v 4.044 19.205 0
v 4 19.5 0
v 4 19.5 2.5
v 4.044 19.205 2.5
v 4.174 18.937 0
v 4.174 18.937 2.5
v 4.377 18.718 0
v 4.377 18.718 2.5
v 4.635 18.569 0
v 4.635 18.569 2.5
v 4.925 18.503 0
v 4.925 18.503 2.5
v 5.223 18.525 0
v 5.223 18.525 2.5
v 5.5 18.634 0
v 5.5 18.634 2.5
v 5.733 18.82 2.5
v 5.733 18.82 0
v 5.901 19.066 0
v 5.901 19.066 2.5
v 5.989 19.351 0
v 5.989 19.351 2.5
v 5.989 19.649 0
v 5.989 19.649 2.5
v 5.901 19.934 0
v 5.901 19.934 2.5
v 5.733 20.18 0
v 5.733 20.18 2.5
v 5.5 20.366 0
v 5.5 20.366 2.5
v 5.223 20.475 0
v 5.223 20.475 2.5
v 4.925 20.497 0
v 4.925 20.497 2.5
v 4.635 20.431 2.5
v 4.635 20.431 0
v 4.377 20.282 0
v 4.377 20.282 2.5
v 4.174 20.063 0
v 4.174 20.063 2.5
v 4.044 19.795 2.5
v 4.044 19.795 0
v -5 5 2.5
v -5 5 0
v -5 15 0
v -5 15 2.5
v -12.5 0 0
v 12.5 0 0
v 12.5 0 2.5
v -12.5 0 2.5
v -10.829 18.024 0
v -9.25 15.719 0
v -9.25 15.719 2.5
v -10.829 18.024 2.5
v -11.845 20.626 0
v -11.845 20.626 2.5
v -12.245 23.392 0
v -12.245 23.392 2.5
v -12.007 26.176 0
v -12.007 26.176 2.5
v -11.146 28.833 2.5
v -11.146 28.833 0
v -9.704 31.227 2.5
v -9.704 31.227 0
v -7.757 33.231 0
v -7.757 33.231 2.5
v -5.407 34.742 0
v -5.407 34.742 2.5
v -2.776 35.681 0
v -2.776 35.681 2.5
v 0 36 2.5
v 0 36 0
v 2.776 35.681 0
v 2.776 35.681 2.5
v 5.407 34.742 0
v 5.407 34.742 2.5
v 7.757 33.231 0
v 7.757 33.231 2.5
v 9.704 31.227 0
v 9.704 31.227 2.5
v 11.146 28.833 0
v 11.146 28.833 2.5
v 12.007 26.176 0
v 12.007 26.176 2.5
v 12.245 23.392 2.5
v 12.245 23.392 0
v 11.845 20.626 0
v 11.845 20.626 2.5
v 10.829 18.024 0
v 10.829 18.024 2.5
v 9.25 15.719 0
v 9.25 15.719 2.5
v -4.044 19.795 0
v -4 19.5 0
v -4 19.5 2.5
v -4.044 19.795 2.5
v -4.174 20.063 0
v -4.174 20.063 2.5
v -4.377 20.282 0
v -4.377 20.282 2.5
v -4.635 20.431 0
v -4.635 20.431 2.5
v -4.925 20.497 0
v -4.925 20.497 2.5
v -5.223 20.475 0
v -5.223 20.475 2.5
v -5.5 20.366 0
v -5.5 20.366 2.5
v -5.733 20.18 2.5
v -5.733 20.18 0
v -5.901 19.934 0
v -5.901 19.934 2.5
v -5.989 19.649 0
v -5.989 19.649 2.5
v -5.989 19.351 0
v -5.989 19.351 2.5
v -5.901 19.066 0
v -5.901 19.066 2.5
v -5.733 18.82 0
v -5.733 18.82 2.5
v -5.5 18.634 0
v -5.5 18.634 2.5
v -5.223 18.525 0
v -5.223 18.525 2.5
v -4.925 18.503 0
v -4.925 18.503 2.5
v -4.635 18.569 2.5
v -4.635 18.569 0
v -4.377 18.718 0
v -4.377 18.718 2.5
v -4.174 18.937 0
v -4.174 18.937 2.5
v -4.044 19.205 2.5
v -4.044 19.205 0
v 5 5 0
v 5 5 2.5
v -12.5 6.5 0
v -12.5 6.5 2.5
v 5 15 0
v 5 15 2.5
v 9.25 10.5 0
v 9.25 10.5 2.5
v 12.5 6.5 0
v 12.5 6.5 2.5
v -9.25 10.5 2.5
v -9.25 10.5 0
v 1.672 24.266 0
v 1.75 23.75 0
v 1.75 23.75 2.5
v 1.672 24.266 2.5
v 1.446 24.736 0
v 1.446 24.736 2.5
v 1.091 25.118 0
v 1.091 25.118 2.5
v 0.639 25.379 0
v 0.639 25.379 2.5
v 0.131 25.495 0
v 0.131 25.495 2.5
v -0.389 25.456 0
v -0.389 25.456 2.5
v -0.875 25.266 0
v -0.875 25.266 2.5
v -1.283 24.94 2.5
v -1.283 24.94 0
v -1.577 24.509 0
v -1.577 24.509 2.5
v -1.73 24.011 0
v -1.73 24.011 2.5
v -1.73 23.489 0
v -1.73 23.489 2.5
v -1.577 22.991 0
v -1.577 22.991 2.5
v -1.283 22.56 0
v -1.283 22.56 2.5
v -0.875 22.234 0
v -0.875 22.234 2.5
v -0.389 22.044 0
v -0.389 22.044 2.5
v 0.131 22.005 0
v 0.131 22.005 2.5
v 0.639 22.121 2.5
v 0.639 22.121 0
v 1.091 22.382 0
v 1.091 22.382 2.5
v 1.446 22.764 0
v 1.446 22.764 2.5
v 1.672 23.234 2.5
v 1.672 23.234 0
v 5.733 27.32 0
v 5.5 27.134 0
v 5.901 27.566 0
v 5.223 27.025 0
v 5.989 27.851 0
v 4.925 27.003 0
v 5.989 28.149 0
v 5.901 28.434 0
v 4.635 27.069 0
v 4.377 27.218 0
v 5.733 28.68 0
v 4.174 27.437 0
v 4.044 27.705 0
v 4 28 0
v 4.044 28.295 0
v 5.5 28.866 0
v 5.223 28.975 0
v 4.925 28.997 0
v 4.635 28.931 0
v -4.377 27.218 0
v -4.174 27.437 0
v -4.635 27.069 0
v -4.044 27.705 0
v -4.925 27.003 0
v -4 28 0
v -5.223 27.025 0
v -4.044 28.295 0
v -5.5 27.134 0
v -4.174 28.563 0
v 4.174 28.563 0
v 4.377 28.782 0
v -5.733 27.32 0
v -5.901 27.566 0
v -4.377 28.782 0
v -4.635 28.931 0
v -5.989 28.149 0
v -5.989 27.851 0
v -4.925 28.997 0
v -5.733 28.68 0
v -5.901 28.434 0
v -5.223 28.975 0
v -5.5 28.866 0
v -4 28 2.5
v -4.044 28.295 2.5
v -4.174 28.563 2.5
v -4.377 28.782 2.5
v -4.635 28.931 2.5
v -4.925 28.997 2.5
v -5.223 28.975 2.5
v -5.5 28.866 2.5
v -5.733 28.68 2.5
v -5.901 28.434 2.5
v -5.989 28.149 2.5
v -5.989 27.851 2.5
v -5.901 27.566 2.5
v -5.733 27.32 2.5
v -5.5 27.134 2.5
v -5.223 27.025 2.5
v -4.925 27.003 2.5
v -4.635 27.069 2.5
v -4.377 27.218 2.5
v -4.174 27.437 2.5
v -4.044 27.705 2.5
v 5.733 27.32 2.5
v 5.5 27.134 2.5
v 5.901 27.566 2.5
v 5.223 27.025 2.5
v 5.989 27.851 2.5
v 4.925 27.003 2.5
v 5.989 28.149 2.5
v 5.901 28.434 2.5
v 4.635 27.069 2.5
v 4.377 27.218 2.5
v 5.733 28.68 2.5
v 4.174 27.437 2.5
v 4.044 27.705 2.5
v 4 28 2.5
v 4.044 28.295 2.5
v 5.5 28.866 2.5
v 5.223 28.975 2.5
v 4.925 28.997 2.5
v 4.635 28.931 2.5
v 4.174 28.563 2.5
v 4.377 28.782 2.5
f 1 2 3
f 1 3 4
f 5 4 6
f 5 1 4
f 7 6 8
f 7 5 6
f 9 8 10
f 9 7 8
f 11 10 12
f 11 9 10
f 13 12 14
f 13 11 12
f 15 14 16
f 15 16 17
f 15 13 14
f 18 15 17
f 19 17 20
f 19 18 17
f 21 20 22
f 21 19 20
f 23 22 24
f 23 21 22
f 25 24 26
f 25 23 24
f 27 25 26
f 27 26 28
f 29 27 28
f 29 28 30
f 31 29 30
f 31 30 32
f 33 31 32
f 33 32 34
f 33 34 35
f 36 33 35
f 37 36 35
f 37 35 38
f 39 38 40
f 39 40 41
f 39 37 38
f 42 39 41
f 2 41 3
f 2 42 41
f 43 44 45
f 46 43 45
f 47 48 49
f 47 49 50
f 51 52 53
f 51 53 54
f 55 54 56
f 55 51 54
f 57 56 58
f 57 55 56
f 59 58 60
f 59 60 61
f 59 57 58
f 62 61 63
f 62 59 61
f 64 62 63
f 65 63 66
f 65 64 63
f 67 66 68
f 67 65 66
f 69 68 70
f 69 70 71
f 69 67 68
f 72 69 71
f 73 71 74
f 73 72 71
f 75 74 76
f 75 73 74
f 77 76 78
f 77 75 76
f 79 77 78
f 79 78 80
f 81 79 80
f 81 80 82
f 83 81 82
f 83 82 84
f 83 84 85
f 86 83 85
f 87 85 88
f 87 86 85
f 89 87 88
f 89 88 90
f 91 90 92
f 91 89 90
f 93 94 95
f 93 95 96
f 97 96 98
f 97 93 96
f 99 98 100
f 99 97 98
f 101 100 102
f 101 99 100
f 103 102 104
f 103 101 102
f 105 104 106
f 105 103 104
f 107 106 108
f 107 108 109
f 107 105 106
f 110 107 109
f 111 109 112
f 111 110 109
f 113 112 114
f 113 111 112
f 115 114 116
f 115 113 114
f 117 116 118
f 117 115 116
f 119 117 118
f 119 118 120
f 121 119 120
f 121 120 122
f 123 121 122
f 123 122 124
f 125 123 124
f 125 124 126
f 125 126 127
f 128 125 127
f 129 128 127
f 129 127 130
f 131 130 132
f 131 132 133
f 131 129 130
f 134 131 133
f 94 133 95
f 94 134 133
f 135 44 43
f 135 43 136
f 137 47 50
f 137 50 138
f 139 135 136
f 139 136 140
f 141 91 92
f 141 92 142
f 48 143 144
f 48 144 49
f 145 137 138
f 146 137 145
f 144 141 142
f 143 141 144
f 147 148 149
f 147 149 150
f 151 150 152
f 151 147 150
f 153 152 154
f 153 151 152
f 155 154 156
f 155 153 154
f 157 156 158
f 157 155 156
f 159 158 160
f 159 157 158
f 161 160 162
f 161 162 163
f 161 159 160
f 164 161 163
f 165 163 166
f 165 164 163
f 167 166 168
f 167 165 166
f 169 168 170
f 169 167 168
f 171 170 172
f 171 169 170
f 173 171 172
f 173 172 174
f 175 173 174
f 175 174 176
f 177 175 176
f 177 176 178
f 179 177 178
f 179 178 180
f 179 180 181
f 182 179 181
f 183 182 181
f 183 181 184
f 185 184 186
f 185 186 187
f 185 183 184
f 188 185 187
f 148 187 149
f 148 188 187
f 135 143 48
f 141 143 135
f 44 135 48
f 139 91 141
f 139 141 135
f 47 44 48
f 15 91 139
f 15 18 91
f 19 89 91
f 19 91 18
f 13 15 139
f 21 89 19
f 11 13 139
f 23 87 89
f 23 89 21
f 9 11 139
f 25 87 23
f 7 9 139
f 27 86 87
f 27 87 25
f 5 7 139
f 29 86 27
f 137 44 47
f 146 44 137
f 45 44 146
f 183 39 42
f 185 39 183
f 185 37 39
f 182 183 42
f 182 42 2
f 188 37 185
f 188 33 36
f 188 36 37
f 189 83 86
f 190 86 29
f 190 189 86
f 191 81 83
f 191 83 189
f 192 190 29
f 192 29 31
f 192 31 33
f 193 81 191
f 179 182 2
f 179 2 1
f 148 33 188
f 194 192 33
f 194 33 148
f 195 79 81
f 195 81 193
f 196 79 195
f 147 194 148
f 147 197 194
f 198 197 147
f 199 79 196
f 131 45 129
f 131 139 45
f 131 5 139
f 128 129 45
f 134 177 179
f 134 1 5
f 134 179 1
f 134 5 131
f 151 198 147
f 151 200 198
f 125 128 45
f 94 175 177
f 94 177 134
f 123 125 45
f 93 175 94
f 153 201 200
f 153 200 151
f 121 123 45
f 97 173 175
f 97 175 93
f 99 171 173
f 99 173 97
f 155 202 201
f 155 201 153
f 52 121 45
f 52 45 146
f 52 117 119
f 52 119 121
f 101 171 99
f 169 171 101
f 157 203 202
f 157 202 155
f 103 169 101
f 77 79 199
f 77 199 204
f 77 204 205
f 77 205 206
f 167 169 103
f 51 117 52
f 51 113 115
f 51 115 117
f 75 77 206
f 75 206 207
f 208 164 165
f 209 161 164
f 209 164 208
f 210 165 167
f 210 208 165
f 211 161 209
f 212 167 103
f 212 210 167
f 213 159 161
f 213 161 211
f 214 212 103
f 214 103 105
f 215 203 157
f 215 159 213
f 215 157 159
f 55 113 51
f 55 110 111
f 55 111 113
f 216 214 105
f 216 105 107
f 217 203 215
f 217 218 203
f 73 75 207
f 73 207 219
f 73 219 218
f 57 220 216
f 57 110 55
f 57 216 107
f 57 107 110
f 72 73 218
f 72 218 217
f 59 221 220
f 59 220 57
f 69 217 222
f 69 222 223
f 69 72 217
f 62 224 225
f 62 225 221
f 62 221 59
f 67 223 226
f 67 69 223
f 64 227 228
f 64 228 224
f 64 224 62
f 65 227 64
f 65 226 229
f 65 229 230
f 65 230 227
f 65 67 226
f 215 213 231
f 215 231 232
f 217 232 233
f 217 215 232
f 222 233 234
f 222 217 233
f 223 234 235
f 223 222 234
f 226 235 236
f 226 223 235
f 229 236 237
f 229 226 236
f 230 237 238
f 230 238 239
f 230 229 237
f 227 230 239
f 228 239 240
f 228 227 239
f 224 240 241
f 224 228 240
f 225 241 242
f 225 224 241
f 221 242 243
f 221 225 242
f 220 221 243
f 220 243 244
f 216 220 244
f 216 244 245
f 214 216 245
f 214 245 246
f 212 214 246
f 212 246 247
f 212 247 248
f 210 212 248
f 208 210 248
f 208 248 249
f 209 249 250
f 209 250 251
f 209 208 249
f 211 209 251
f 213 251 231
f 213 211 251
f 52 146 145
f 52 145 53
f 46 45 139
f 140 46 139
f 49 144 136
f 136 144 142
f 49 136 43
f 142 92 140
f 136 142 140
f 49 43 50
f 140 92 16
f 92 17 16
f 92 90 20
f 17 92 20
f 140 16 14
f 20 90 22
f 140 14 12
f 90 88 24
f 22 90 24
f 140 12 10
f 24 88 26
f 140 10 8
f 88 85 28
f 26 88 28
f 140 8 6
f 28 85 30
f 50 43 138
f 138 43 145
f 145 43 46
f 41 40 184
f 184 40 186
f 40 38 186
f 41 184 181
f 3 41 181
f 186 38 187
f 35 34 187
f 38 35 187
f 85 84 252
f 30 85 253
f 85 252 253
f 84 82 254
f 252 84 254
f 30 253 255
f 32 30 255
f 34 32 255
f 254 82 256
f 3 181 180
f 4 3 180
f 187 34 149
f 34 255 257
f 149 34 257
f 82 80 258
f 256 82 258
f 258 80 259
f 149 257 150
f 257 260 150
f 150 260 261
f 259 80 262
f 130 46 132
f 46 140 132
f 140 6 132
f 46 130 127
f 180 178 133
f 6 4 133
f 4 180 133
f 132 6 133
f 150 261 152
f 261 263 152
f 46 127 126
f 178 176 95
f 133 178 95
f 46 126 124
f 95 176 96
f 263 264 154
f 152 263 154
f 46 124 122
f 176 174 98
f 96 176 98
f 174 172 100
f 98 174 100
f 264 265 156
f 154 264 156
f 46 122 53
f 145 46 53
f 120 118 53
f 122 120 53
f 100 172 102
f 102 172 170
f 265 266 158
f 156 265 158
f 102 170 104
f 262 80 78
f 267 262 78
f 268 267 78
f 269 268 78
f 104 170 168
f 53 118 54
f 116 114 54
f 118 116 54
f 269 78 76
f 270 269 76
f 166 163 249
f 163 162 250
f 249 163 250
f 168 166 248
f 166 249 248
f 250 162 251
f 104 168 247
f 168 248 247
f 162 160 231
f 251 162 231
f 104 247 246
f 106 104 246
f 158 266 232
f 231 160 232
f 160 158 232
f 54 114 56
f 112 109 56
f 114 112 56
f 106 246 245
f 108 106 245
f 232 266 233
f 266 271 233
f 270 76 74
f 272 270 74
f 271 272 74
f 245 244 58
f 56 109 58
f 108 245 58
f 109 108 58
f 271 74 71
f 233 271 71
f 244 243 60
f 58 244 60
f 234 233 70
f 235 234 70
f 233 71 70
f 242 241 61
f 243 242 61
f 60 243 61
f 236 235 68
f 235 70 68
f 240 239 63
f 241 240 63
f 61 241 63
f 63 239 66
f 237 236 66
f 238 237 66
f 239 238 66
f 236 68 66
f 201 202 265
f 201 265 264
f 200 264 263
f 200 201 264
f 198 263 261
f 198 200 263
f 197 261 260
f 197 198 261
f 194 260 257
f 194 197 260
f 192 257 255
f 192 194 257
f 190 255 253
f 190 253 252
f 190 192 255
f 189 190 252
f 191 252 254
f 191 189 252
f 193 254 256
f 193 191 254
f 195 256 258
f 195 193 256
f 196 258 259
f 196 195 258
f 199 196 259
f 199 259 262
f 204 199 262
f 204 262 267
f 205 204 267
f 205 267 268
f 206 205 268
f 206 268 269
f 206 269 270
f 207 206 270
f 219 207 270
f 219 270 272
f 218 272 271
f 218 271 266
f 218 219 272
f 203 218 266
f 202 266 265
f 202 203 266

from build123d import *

# Parameters (mm, degrees)
SZKIC1_R                    = 1.75
SZKIC1_R_2                  = 1
SZKIC1_W                    = 10
SZKIC1_H                    = 10
DODANIE_WYCI_GNI_CIE1_DEPTH = 2.5


with BuildPart() as part:
    # Szkic1 → Dodanie-wyciągnięcie1 (new body)
    with BuildSketch(Plane.XY):
        with BuildLine():
            Line((12.5, 0), (-12.5, 0))
            Line((-12.5, 0), (-12.5, 6.5))
            Line((-12.5, 6.5), (-9.25, 10.5))
            Line((-9.25, 10.5), (-9.25, 15.718810798))
            ThreePointArc((-9.25, 15.718810798), (0, 36), (9.25, 15.718810798))
            Line((9.25, 15.718810798), (9.25, 10.5))
            Line((9.25, 10.5), (12.5, 6.5))
            Line((12.5, 6.5), (12.5, 0))
        make_face()
        with Locations((0, 23.75)):
            Circle(SZKIC1_R, mode=Mode.SUBTRACT)
        with Locations((-5, 28)):
            Circle(SZKIC1_R_2, mode=Mode.SUBTRACT)
        with Locations((-5, 19.5)):
            Circle(SZKIC1_R_2, mode=Mode.SUBTRACT)
        with Locations(Location((5, 19.5, 0), (0, 0, 180))):
            Circle(SZKIC1_R_2, mode=Mode.SUBTRACT)
        with Locations(Location((5, 28, 0), (0, 0, 180))):
            Circle(SZKIC1_R_2, mode=Mode.SUBTRACT)
        with Locations((0, 10)):
            Rectangle(SZKIC1_W, SZKIC1_H, mode=Mode.SUBTRACT)
    extrude(amount=DODANIE_WYCI_GNI_CIE1_DEPTH)


solid = part.part
